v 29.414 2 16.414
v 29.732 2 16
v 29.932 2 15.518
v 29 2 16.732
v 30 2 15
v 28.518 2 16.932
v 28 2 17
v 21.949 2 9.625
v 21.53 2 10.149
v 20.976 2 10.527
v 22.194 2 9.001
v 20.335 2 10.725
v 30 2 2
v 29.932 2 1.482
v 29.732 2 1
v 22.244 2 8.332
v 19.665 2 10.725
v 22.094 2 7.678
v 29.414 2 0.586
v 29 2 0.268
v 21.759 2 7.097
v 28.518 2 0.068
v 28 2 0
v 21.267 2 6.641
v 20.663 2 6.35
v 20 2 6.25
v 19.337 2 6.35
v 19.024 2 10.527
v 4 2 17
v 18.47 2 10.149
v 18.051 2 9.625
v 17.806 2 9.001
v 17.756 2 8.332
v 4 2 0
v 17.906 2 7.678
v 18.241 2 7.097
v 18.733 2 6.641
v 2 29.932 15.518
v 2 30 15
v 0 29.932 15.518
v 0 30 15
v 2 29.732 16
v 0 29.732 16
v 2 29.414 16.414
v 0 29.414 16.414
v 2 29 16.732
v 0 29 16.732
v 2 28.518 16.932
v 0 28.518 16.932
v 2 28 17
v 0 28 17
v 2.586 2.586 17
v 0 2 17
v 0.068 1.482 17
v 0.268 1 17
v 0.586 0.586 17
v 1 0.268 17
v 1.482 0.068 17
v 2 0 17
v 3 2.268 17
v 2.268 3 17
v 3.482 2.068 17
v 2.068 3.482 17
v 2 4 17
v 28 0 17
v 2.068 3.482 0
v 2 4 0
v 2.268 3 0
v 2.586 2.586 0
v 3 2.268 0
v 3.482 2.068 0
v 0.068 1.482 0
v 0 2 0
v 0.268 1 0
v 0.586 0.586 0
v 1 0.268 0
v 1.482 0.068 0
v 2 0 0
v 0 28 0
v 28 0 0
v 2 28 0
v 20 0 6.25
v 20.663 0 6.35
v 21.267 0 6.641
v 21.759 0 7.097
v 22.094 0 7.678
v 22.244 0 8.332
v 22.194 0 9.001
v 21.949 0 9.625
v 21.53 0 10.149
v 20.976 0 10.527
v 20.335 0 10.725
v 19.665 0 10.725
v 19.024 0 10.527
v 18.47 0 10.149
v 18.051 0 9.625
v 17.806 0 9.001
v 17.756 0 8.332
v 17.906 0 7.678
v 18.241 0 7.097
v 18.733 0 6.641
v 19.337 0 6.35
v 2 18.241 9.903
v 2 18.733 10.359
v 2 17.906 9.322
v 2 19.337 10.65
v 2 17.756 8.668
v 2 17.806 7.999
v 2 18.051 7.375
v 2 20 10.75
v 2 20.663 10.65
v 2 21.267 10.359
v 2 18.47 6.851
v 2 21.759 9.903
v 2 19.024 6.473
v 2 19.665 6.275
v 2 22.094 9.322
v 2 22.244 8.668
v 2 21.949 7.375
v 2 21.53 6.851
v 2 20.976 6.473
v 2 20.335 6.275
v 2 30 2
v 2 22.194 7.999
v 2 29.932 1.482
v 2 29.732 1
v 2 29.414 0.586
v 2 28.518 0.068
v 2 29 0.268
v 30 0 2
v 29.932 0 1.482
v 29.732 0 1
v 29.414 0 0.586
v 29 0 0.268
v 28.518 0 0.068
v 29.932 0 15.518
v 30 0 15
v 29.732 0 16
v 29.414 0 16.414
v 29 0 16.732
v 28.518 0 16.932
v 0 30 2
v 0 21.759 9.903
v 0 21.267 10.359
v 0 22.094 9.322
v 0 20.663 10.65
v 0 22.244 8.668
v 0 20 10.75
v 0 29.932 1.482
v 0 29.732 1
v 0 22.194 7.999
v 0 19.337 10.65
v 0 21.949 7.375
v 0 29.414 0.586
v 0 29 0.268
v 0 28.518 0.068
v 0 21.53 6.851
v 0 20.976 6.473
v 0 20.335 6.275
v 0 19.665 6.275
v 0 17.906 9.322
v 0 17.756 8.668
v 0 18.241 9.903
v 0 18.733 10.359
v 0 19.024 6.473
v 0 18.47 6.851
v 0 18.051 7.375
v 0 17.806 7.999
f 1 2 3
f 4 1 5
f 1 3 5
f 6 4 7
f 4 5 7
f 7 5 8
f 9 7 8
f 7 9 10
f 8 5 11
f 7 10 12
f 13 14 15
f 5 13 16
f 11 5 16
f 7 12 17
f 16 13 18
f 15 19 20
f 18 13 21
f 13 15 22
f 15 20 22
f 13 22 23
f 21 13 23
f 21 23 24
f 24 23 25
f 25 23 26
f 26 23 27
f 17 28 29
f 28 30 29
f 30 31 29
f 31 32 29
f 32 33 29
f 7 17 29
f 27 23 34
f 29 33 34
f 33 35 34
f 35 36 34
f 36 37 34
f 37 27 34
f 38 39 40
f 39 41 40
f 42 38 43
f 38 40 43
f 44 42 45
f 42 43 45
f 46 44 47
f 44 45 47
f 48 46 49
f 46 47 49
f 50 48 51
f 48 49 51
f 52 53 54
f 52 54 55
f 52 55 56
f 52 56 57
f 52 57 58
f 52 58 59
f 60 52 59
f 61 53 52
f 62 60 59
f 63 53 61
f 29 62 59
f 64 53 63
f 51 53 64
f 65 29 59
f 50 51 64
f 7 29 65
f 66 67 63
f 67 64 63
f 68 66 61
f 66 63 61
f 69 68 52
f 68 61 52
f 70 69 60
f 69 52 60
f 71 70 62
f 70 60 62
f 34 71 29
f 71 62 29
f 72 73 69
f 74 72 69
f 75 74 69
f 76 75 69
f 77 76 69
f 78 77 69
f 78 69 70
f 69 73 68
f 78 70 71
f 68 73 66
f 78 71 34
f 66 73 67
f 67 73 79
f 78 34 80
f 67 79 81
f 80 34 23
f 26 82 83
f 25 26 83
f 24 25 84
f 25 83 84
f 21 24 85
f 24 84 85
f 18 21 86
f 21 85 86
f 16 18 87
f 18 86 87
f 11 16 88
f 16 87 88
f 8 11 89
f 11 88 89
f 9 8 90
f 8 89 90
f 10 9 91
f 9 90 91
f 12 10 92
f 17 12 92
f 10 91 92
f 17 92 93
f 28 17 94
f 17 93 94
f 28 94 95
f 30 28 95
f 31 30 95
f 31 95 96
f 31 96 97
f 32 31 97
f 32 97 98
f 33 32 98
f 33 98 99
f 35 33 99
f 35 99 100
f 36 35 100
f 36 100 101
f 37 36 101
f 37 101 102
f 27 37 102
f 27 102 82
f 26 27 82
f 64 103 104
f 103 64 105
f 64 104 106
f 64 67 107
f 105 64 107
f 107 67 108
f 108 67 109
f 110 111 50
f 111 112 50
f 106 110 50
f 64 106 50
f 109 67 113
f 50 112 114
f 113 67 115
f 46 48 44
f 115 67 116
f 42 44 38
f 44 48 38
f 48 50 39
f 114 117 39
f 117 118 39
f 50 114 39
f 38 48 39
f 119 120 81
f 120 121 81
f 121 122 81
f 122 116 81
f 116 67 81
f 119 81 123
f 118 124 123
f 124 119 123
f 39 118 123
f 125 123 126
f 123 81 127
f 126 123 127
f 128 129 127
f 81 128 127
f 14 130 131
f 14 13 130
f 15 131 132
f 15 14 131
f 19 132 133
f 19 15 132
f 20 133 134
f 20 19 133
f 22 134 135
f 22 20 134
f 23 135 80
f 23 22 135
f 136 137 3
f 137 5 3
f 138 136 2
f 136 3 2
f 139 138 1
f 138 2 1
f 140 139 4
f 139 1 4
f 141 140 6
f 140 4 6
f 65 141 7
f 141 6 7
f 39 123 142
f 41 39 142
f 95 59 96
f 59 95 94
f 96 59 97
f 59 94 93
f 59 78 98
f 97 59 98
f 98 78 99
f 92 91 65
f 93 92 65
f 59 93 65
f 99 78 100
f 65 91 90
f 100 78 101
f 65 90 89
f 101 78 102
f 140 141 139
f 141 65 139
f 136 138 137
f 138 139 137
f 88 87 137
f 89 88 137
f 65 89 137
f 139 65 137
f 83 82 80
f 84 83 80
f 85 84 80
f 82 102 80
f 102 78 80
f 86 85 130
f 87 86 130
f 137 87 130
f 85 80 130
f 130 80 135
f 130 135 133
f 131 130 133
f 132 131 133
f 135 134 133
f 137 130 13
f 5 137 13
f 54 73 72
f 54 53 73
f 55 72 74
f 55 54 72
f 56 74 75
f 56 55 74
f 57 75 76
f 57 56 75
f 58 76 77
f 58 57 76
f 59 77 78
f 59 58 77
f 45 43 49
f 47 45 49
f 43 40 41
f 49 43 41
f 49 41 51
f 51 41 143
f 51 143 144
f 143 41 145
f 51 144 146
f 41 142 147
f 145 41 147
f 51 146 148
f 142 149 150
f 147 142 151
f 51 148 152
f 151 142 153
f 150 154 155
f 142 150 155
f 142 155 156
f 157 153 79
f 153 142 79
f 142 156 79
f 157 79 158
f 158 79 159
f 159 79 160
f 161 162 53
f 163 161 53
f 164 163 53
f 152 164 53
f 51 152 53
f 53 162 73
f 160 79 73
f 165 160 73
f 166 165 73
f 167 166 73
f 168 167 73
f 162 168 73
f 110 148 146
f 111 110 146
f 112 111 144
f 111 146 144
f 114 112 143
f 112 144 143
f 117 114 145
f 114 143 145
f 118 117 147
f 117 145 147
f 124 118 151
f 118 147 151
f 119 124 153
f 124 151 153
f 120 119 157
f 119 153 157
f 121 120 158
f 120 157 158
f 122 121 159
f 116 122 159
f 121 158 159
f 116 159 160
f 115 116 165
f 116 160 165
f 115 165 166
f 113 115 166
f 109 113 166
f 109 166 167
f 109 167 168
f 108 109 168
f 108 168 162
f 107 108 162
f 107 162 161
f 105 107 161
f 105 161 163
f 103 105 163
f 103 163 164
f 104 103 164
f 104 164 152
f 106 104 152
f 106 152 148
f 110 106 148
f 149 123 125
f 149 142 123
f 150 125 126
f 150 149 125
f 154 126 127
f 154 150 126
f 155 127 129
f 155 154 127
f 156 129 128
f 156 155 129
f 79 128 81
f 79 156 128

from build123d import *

# Parameters (mm, degrees)
EXTRUDE_THIN1_DEPTH = 17
FILLET1_R           = 2
FILLET2_R           = 2
SKETCH2_R           = 2.25
CUT_EXTRUDE1_DEPTH  = 10
SKETCH4_R           = 2.25
CUT_EXTRUDE2_DEPTH  = 10


with BuildPart() as part:
    # Sketch1 → Extrude-Thin1 (new body)
    with BuildSketch(Plane.XY):
        Polygon((0, 30), (0, 0), (30, 0), (30, 2), (2, 2), (2, 30), align=None)
    extrude(amount=EXTRUDE_THIN1_DEPTH)

    # Fillet1
    fillet1_edges = [part.edges().sort_by_distance(p)[0] for p in [
        (1, 30, 17),
        (1, 30, 0),
        (30, 1, 0),
        (30, 1, 17),
    ]]
    fillet(fillet1_edges, radius=FILLET1_R)

    # Fillet2
    fillet2_edges = [part.edges().sort_by_distance(p)[0] for p in [
        (0, 0, 8.5),
        (2, 2, 8.5),
    ]]
    fillet(fillet2_edges, radius=FILLET2_R)

    # Sketch2 → Cut-Extrude1 (cut)
    with BuildSketch(Plane.ZY):
        with Locations((8.5, 20)):
            Circle(SKETCH2_R)
    extrude(amount=-CUT_EXTRUDE1_DEPTH, mode=Mode.SUBTRACT)

    # Sketch4 → Cut-Extrude2 (cut)
    with BuildSketch(Plane.XZ):
        with Locations(Location((20, 8.5, 0), (0, 0, 270))):
            Circle(SKETCH4_R)
    extrude(amount=-CUT_EXTRUDE2_DEPTH, mode=Mode.SUBTRACT)


solid = part.part
